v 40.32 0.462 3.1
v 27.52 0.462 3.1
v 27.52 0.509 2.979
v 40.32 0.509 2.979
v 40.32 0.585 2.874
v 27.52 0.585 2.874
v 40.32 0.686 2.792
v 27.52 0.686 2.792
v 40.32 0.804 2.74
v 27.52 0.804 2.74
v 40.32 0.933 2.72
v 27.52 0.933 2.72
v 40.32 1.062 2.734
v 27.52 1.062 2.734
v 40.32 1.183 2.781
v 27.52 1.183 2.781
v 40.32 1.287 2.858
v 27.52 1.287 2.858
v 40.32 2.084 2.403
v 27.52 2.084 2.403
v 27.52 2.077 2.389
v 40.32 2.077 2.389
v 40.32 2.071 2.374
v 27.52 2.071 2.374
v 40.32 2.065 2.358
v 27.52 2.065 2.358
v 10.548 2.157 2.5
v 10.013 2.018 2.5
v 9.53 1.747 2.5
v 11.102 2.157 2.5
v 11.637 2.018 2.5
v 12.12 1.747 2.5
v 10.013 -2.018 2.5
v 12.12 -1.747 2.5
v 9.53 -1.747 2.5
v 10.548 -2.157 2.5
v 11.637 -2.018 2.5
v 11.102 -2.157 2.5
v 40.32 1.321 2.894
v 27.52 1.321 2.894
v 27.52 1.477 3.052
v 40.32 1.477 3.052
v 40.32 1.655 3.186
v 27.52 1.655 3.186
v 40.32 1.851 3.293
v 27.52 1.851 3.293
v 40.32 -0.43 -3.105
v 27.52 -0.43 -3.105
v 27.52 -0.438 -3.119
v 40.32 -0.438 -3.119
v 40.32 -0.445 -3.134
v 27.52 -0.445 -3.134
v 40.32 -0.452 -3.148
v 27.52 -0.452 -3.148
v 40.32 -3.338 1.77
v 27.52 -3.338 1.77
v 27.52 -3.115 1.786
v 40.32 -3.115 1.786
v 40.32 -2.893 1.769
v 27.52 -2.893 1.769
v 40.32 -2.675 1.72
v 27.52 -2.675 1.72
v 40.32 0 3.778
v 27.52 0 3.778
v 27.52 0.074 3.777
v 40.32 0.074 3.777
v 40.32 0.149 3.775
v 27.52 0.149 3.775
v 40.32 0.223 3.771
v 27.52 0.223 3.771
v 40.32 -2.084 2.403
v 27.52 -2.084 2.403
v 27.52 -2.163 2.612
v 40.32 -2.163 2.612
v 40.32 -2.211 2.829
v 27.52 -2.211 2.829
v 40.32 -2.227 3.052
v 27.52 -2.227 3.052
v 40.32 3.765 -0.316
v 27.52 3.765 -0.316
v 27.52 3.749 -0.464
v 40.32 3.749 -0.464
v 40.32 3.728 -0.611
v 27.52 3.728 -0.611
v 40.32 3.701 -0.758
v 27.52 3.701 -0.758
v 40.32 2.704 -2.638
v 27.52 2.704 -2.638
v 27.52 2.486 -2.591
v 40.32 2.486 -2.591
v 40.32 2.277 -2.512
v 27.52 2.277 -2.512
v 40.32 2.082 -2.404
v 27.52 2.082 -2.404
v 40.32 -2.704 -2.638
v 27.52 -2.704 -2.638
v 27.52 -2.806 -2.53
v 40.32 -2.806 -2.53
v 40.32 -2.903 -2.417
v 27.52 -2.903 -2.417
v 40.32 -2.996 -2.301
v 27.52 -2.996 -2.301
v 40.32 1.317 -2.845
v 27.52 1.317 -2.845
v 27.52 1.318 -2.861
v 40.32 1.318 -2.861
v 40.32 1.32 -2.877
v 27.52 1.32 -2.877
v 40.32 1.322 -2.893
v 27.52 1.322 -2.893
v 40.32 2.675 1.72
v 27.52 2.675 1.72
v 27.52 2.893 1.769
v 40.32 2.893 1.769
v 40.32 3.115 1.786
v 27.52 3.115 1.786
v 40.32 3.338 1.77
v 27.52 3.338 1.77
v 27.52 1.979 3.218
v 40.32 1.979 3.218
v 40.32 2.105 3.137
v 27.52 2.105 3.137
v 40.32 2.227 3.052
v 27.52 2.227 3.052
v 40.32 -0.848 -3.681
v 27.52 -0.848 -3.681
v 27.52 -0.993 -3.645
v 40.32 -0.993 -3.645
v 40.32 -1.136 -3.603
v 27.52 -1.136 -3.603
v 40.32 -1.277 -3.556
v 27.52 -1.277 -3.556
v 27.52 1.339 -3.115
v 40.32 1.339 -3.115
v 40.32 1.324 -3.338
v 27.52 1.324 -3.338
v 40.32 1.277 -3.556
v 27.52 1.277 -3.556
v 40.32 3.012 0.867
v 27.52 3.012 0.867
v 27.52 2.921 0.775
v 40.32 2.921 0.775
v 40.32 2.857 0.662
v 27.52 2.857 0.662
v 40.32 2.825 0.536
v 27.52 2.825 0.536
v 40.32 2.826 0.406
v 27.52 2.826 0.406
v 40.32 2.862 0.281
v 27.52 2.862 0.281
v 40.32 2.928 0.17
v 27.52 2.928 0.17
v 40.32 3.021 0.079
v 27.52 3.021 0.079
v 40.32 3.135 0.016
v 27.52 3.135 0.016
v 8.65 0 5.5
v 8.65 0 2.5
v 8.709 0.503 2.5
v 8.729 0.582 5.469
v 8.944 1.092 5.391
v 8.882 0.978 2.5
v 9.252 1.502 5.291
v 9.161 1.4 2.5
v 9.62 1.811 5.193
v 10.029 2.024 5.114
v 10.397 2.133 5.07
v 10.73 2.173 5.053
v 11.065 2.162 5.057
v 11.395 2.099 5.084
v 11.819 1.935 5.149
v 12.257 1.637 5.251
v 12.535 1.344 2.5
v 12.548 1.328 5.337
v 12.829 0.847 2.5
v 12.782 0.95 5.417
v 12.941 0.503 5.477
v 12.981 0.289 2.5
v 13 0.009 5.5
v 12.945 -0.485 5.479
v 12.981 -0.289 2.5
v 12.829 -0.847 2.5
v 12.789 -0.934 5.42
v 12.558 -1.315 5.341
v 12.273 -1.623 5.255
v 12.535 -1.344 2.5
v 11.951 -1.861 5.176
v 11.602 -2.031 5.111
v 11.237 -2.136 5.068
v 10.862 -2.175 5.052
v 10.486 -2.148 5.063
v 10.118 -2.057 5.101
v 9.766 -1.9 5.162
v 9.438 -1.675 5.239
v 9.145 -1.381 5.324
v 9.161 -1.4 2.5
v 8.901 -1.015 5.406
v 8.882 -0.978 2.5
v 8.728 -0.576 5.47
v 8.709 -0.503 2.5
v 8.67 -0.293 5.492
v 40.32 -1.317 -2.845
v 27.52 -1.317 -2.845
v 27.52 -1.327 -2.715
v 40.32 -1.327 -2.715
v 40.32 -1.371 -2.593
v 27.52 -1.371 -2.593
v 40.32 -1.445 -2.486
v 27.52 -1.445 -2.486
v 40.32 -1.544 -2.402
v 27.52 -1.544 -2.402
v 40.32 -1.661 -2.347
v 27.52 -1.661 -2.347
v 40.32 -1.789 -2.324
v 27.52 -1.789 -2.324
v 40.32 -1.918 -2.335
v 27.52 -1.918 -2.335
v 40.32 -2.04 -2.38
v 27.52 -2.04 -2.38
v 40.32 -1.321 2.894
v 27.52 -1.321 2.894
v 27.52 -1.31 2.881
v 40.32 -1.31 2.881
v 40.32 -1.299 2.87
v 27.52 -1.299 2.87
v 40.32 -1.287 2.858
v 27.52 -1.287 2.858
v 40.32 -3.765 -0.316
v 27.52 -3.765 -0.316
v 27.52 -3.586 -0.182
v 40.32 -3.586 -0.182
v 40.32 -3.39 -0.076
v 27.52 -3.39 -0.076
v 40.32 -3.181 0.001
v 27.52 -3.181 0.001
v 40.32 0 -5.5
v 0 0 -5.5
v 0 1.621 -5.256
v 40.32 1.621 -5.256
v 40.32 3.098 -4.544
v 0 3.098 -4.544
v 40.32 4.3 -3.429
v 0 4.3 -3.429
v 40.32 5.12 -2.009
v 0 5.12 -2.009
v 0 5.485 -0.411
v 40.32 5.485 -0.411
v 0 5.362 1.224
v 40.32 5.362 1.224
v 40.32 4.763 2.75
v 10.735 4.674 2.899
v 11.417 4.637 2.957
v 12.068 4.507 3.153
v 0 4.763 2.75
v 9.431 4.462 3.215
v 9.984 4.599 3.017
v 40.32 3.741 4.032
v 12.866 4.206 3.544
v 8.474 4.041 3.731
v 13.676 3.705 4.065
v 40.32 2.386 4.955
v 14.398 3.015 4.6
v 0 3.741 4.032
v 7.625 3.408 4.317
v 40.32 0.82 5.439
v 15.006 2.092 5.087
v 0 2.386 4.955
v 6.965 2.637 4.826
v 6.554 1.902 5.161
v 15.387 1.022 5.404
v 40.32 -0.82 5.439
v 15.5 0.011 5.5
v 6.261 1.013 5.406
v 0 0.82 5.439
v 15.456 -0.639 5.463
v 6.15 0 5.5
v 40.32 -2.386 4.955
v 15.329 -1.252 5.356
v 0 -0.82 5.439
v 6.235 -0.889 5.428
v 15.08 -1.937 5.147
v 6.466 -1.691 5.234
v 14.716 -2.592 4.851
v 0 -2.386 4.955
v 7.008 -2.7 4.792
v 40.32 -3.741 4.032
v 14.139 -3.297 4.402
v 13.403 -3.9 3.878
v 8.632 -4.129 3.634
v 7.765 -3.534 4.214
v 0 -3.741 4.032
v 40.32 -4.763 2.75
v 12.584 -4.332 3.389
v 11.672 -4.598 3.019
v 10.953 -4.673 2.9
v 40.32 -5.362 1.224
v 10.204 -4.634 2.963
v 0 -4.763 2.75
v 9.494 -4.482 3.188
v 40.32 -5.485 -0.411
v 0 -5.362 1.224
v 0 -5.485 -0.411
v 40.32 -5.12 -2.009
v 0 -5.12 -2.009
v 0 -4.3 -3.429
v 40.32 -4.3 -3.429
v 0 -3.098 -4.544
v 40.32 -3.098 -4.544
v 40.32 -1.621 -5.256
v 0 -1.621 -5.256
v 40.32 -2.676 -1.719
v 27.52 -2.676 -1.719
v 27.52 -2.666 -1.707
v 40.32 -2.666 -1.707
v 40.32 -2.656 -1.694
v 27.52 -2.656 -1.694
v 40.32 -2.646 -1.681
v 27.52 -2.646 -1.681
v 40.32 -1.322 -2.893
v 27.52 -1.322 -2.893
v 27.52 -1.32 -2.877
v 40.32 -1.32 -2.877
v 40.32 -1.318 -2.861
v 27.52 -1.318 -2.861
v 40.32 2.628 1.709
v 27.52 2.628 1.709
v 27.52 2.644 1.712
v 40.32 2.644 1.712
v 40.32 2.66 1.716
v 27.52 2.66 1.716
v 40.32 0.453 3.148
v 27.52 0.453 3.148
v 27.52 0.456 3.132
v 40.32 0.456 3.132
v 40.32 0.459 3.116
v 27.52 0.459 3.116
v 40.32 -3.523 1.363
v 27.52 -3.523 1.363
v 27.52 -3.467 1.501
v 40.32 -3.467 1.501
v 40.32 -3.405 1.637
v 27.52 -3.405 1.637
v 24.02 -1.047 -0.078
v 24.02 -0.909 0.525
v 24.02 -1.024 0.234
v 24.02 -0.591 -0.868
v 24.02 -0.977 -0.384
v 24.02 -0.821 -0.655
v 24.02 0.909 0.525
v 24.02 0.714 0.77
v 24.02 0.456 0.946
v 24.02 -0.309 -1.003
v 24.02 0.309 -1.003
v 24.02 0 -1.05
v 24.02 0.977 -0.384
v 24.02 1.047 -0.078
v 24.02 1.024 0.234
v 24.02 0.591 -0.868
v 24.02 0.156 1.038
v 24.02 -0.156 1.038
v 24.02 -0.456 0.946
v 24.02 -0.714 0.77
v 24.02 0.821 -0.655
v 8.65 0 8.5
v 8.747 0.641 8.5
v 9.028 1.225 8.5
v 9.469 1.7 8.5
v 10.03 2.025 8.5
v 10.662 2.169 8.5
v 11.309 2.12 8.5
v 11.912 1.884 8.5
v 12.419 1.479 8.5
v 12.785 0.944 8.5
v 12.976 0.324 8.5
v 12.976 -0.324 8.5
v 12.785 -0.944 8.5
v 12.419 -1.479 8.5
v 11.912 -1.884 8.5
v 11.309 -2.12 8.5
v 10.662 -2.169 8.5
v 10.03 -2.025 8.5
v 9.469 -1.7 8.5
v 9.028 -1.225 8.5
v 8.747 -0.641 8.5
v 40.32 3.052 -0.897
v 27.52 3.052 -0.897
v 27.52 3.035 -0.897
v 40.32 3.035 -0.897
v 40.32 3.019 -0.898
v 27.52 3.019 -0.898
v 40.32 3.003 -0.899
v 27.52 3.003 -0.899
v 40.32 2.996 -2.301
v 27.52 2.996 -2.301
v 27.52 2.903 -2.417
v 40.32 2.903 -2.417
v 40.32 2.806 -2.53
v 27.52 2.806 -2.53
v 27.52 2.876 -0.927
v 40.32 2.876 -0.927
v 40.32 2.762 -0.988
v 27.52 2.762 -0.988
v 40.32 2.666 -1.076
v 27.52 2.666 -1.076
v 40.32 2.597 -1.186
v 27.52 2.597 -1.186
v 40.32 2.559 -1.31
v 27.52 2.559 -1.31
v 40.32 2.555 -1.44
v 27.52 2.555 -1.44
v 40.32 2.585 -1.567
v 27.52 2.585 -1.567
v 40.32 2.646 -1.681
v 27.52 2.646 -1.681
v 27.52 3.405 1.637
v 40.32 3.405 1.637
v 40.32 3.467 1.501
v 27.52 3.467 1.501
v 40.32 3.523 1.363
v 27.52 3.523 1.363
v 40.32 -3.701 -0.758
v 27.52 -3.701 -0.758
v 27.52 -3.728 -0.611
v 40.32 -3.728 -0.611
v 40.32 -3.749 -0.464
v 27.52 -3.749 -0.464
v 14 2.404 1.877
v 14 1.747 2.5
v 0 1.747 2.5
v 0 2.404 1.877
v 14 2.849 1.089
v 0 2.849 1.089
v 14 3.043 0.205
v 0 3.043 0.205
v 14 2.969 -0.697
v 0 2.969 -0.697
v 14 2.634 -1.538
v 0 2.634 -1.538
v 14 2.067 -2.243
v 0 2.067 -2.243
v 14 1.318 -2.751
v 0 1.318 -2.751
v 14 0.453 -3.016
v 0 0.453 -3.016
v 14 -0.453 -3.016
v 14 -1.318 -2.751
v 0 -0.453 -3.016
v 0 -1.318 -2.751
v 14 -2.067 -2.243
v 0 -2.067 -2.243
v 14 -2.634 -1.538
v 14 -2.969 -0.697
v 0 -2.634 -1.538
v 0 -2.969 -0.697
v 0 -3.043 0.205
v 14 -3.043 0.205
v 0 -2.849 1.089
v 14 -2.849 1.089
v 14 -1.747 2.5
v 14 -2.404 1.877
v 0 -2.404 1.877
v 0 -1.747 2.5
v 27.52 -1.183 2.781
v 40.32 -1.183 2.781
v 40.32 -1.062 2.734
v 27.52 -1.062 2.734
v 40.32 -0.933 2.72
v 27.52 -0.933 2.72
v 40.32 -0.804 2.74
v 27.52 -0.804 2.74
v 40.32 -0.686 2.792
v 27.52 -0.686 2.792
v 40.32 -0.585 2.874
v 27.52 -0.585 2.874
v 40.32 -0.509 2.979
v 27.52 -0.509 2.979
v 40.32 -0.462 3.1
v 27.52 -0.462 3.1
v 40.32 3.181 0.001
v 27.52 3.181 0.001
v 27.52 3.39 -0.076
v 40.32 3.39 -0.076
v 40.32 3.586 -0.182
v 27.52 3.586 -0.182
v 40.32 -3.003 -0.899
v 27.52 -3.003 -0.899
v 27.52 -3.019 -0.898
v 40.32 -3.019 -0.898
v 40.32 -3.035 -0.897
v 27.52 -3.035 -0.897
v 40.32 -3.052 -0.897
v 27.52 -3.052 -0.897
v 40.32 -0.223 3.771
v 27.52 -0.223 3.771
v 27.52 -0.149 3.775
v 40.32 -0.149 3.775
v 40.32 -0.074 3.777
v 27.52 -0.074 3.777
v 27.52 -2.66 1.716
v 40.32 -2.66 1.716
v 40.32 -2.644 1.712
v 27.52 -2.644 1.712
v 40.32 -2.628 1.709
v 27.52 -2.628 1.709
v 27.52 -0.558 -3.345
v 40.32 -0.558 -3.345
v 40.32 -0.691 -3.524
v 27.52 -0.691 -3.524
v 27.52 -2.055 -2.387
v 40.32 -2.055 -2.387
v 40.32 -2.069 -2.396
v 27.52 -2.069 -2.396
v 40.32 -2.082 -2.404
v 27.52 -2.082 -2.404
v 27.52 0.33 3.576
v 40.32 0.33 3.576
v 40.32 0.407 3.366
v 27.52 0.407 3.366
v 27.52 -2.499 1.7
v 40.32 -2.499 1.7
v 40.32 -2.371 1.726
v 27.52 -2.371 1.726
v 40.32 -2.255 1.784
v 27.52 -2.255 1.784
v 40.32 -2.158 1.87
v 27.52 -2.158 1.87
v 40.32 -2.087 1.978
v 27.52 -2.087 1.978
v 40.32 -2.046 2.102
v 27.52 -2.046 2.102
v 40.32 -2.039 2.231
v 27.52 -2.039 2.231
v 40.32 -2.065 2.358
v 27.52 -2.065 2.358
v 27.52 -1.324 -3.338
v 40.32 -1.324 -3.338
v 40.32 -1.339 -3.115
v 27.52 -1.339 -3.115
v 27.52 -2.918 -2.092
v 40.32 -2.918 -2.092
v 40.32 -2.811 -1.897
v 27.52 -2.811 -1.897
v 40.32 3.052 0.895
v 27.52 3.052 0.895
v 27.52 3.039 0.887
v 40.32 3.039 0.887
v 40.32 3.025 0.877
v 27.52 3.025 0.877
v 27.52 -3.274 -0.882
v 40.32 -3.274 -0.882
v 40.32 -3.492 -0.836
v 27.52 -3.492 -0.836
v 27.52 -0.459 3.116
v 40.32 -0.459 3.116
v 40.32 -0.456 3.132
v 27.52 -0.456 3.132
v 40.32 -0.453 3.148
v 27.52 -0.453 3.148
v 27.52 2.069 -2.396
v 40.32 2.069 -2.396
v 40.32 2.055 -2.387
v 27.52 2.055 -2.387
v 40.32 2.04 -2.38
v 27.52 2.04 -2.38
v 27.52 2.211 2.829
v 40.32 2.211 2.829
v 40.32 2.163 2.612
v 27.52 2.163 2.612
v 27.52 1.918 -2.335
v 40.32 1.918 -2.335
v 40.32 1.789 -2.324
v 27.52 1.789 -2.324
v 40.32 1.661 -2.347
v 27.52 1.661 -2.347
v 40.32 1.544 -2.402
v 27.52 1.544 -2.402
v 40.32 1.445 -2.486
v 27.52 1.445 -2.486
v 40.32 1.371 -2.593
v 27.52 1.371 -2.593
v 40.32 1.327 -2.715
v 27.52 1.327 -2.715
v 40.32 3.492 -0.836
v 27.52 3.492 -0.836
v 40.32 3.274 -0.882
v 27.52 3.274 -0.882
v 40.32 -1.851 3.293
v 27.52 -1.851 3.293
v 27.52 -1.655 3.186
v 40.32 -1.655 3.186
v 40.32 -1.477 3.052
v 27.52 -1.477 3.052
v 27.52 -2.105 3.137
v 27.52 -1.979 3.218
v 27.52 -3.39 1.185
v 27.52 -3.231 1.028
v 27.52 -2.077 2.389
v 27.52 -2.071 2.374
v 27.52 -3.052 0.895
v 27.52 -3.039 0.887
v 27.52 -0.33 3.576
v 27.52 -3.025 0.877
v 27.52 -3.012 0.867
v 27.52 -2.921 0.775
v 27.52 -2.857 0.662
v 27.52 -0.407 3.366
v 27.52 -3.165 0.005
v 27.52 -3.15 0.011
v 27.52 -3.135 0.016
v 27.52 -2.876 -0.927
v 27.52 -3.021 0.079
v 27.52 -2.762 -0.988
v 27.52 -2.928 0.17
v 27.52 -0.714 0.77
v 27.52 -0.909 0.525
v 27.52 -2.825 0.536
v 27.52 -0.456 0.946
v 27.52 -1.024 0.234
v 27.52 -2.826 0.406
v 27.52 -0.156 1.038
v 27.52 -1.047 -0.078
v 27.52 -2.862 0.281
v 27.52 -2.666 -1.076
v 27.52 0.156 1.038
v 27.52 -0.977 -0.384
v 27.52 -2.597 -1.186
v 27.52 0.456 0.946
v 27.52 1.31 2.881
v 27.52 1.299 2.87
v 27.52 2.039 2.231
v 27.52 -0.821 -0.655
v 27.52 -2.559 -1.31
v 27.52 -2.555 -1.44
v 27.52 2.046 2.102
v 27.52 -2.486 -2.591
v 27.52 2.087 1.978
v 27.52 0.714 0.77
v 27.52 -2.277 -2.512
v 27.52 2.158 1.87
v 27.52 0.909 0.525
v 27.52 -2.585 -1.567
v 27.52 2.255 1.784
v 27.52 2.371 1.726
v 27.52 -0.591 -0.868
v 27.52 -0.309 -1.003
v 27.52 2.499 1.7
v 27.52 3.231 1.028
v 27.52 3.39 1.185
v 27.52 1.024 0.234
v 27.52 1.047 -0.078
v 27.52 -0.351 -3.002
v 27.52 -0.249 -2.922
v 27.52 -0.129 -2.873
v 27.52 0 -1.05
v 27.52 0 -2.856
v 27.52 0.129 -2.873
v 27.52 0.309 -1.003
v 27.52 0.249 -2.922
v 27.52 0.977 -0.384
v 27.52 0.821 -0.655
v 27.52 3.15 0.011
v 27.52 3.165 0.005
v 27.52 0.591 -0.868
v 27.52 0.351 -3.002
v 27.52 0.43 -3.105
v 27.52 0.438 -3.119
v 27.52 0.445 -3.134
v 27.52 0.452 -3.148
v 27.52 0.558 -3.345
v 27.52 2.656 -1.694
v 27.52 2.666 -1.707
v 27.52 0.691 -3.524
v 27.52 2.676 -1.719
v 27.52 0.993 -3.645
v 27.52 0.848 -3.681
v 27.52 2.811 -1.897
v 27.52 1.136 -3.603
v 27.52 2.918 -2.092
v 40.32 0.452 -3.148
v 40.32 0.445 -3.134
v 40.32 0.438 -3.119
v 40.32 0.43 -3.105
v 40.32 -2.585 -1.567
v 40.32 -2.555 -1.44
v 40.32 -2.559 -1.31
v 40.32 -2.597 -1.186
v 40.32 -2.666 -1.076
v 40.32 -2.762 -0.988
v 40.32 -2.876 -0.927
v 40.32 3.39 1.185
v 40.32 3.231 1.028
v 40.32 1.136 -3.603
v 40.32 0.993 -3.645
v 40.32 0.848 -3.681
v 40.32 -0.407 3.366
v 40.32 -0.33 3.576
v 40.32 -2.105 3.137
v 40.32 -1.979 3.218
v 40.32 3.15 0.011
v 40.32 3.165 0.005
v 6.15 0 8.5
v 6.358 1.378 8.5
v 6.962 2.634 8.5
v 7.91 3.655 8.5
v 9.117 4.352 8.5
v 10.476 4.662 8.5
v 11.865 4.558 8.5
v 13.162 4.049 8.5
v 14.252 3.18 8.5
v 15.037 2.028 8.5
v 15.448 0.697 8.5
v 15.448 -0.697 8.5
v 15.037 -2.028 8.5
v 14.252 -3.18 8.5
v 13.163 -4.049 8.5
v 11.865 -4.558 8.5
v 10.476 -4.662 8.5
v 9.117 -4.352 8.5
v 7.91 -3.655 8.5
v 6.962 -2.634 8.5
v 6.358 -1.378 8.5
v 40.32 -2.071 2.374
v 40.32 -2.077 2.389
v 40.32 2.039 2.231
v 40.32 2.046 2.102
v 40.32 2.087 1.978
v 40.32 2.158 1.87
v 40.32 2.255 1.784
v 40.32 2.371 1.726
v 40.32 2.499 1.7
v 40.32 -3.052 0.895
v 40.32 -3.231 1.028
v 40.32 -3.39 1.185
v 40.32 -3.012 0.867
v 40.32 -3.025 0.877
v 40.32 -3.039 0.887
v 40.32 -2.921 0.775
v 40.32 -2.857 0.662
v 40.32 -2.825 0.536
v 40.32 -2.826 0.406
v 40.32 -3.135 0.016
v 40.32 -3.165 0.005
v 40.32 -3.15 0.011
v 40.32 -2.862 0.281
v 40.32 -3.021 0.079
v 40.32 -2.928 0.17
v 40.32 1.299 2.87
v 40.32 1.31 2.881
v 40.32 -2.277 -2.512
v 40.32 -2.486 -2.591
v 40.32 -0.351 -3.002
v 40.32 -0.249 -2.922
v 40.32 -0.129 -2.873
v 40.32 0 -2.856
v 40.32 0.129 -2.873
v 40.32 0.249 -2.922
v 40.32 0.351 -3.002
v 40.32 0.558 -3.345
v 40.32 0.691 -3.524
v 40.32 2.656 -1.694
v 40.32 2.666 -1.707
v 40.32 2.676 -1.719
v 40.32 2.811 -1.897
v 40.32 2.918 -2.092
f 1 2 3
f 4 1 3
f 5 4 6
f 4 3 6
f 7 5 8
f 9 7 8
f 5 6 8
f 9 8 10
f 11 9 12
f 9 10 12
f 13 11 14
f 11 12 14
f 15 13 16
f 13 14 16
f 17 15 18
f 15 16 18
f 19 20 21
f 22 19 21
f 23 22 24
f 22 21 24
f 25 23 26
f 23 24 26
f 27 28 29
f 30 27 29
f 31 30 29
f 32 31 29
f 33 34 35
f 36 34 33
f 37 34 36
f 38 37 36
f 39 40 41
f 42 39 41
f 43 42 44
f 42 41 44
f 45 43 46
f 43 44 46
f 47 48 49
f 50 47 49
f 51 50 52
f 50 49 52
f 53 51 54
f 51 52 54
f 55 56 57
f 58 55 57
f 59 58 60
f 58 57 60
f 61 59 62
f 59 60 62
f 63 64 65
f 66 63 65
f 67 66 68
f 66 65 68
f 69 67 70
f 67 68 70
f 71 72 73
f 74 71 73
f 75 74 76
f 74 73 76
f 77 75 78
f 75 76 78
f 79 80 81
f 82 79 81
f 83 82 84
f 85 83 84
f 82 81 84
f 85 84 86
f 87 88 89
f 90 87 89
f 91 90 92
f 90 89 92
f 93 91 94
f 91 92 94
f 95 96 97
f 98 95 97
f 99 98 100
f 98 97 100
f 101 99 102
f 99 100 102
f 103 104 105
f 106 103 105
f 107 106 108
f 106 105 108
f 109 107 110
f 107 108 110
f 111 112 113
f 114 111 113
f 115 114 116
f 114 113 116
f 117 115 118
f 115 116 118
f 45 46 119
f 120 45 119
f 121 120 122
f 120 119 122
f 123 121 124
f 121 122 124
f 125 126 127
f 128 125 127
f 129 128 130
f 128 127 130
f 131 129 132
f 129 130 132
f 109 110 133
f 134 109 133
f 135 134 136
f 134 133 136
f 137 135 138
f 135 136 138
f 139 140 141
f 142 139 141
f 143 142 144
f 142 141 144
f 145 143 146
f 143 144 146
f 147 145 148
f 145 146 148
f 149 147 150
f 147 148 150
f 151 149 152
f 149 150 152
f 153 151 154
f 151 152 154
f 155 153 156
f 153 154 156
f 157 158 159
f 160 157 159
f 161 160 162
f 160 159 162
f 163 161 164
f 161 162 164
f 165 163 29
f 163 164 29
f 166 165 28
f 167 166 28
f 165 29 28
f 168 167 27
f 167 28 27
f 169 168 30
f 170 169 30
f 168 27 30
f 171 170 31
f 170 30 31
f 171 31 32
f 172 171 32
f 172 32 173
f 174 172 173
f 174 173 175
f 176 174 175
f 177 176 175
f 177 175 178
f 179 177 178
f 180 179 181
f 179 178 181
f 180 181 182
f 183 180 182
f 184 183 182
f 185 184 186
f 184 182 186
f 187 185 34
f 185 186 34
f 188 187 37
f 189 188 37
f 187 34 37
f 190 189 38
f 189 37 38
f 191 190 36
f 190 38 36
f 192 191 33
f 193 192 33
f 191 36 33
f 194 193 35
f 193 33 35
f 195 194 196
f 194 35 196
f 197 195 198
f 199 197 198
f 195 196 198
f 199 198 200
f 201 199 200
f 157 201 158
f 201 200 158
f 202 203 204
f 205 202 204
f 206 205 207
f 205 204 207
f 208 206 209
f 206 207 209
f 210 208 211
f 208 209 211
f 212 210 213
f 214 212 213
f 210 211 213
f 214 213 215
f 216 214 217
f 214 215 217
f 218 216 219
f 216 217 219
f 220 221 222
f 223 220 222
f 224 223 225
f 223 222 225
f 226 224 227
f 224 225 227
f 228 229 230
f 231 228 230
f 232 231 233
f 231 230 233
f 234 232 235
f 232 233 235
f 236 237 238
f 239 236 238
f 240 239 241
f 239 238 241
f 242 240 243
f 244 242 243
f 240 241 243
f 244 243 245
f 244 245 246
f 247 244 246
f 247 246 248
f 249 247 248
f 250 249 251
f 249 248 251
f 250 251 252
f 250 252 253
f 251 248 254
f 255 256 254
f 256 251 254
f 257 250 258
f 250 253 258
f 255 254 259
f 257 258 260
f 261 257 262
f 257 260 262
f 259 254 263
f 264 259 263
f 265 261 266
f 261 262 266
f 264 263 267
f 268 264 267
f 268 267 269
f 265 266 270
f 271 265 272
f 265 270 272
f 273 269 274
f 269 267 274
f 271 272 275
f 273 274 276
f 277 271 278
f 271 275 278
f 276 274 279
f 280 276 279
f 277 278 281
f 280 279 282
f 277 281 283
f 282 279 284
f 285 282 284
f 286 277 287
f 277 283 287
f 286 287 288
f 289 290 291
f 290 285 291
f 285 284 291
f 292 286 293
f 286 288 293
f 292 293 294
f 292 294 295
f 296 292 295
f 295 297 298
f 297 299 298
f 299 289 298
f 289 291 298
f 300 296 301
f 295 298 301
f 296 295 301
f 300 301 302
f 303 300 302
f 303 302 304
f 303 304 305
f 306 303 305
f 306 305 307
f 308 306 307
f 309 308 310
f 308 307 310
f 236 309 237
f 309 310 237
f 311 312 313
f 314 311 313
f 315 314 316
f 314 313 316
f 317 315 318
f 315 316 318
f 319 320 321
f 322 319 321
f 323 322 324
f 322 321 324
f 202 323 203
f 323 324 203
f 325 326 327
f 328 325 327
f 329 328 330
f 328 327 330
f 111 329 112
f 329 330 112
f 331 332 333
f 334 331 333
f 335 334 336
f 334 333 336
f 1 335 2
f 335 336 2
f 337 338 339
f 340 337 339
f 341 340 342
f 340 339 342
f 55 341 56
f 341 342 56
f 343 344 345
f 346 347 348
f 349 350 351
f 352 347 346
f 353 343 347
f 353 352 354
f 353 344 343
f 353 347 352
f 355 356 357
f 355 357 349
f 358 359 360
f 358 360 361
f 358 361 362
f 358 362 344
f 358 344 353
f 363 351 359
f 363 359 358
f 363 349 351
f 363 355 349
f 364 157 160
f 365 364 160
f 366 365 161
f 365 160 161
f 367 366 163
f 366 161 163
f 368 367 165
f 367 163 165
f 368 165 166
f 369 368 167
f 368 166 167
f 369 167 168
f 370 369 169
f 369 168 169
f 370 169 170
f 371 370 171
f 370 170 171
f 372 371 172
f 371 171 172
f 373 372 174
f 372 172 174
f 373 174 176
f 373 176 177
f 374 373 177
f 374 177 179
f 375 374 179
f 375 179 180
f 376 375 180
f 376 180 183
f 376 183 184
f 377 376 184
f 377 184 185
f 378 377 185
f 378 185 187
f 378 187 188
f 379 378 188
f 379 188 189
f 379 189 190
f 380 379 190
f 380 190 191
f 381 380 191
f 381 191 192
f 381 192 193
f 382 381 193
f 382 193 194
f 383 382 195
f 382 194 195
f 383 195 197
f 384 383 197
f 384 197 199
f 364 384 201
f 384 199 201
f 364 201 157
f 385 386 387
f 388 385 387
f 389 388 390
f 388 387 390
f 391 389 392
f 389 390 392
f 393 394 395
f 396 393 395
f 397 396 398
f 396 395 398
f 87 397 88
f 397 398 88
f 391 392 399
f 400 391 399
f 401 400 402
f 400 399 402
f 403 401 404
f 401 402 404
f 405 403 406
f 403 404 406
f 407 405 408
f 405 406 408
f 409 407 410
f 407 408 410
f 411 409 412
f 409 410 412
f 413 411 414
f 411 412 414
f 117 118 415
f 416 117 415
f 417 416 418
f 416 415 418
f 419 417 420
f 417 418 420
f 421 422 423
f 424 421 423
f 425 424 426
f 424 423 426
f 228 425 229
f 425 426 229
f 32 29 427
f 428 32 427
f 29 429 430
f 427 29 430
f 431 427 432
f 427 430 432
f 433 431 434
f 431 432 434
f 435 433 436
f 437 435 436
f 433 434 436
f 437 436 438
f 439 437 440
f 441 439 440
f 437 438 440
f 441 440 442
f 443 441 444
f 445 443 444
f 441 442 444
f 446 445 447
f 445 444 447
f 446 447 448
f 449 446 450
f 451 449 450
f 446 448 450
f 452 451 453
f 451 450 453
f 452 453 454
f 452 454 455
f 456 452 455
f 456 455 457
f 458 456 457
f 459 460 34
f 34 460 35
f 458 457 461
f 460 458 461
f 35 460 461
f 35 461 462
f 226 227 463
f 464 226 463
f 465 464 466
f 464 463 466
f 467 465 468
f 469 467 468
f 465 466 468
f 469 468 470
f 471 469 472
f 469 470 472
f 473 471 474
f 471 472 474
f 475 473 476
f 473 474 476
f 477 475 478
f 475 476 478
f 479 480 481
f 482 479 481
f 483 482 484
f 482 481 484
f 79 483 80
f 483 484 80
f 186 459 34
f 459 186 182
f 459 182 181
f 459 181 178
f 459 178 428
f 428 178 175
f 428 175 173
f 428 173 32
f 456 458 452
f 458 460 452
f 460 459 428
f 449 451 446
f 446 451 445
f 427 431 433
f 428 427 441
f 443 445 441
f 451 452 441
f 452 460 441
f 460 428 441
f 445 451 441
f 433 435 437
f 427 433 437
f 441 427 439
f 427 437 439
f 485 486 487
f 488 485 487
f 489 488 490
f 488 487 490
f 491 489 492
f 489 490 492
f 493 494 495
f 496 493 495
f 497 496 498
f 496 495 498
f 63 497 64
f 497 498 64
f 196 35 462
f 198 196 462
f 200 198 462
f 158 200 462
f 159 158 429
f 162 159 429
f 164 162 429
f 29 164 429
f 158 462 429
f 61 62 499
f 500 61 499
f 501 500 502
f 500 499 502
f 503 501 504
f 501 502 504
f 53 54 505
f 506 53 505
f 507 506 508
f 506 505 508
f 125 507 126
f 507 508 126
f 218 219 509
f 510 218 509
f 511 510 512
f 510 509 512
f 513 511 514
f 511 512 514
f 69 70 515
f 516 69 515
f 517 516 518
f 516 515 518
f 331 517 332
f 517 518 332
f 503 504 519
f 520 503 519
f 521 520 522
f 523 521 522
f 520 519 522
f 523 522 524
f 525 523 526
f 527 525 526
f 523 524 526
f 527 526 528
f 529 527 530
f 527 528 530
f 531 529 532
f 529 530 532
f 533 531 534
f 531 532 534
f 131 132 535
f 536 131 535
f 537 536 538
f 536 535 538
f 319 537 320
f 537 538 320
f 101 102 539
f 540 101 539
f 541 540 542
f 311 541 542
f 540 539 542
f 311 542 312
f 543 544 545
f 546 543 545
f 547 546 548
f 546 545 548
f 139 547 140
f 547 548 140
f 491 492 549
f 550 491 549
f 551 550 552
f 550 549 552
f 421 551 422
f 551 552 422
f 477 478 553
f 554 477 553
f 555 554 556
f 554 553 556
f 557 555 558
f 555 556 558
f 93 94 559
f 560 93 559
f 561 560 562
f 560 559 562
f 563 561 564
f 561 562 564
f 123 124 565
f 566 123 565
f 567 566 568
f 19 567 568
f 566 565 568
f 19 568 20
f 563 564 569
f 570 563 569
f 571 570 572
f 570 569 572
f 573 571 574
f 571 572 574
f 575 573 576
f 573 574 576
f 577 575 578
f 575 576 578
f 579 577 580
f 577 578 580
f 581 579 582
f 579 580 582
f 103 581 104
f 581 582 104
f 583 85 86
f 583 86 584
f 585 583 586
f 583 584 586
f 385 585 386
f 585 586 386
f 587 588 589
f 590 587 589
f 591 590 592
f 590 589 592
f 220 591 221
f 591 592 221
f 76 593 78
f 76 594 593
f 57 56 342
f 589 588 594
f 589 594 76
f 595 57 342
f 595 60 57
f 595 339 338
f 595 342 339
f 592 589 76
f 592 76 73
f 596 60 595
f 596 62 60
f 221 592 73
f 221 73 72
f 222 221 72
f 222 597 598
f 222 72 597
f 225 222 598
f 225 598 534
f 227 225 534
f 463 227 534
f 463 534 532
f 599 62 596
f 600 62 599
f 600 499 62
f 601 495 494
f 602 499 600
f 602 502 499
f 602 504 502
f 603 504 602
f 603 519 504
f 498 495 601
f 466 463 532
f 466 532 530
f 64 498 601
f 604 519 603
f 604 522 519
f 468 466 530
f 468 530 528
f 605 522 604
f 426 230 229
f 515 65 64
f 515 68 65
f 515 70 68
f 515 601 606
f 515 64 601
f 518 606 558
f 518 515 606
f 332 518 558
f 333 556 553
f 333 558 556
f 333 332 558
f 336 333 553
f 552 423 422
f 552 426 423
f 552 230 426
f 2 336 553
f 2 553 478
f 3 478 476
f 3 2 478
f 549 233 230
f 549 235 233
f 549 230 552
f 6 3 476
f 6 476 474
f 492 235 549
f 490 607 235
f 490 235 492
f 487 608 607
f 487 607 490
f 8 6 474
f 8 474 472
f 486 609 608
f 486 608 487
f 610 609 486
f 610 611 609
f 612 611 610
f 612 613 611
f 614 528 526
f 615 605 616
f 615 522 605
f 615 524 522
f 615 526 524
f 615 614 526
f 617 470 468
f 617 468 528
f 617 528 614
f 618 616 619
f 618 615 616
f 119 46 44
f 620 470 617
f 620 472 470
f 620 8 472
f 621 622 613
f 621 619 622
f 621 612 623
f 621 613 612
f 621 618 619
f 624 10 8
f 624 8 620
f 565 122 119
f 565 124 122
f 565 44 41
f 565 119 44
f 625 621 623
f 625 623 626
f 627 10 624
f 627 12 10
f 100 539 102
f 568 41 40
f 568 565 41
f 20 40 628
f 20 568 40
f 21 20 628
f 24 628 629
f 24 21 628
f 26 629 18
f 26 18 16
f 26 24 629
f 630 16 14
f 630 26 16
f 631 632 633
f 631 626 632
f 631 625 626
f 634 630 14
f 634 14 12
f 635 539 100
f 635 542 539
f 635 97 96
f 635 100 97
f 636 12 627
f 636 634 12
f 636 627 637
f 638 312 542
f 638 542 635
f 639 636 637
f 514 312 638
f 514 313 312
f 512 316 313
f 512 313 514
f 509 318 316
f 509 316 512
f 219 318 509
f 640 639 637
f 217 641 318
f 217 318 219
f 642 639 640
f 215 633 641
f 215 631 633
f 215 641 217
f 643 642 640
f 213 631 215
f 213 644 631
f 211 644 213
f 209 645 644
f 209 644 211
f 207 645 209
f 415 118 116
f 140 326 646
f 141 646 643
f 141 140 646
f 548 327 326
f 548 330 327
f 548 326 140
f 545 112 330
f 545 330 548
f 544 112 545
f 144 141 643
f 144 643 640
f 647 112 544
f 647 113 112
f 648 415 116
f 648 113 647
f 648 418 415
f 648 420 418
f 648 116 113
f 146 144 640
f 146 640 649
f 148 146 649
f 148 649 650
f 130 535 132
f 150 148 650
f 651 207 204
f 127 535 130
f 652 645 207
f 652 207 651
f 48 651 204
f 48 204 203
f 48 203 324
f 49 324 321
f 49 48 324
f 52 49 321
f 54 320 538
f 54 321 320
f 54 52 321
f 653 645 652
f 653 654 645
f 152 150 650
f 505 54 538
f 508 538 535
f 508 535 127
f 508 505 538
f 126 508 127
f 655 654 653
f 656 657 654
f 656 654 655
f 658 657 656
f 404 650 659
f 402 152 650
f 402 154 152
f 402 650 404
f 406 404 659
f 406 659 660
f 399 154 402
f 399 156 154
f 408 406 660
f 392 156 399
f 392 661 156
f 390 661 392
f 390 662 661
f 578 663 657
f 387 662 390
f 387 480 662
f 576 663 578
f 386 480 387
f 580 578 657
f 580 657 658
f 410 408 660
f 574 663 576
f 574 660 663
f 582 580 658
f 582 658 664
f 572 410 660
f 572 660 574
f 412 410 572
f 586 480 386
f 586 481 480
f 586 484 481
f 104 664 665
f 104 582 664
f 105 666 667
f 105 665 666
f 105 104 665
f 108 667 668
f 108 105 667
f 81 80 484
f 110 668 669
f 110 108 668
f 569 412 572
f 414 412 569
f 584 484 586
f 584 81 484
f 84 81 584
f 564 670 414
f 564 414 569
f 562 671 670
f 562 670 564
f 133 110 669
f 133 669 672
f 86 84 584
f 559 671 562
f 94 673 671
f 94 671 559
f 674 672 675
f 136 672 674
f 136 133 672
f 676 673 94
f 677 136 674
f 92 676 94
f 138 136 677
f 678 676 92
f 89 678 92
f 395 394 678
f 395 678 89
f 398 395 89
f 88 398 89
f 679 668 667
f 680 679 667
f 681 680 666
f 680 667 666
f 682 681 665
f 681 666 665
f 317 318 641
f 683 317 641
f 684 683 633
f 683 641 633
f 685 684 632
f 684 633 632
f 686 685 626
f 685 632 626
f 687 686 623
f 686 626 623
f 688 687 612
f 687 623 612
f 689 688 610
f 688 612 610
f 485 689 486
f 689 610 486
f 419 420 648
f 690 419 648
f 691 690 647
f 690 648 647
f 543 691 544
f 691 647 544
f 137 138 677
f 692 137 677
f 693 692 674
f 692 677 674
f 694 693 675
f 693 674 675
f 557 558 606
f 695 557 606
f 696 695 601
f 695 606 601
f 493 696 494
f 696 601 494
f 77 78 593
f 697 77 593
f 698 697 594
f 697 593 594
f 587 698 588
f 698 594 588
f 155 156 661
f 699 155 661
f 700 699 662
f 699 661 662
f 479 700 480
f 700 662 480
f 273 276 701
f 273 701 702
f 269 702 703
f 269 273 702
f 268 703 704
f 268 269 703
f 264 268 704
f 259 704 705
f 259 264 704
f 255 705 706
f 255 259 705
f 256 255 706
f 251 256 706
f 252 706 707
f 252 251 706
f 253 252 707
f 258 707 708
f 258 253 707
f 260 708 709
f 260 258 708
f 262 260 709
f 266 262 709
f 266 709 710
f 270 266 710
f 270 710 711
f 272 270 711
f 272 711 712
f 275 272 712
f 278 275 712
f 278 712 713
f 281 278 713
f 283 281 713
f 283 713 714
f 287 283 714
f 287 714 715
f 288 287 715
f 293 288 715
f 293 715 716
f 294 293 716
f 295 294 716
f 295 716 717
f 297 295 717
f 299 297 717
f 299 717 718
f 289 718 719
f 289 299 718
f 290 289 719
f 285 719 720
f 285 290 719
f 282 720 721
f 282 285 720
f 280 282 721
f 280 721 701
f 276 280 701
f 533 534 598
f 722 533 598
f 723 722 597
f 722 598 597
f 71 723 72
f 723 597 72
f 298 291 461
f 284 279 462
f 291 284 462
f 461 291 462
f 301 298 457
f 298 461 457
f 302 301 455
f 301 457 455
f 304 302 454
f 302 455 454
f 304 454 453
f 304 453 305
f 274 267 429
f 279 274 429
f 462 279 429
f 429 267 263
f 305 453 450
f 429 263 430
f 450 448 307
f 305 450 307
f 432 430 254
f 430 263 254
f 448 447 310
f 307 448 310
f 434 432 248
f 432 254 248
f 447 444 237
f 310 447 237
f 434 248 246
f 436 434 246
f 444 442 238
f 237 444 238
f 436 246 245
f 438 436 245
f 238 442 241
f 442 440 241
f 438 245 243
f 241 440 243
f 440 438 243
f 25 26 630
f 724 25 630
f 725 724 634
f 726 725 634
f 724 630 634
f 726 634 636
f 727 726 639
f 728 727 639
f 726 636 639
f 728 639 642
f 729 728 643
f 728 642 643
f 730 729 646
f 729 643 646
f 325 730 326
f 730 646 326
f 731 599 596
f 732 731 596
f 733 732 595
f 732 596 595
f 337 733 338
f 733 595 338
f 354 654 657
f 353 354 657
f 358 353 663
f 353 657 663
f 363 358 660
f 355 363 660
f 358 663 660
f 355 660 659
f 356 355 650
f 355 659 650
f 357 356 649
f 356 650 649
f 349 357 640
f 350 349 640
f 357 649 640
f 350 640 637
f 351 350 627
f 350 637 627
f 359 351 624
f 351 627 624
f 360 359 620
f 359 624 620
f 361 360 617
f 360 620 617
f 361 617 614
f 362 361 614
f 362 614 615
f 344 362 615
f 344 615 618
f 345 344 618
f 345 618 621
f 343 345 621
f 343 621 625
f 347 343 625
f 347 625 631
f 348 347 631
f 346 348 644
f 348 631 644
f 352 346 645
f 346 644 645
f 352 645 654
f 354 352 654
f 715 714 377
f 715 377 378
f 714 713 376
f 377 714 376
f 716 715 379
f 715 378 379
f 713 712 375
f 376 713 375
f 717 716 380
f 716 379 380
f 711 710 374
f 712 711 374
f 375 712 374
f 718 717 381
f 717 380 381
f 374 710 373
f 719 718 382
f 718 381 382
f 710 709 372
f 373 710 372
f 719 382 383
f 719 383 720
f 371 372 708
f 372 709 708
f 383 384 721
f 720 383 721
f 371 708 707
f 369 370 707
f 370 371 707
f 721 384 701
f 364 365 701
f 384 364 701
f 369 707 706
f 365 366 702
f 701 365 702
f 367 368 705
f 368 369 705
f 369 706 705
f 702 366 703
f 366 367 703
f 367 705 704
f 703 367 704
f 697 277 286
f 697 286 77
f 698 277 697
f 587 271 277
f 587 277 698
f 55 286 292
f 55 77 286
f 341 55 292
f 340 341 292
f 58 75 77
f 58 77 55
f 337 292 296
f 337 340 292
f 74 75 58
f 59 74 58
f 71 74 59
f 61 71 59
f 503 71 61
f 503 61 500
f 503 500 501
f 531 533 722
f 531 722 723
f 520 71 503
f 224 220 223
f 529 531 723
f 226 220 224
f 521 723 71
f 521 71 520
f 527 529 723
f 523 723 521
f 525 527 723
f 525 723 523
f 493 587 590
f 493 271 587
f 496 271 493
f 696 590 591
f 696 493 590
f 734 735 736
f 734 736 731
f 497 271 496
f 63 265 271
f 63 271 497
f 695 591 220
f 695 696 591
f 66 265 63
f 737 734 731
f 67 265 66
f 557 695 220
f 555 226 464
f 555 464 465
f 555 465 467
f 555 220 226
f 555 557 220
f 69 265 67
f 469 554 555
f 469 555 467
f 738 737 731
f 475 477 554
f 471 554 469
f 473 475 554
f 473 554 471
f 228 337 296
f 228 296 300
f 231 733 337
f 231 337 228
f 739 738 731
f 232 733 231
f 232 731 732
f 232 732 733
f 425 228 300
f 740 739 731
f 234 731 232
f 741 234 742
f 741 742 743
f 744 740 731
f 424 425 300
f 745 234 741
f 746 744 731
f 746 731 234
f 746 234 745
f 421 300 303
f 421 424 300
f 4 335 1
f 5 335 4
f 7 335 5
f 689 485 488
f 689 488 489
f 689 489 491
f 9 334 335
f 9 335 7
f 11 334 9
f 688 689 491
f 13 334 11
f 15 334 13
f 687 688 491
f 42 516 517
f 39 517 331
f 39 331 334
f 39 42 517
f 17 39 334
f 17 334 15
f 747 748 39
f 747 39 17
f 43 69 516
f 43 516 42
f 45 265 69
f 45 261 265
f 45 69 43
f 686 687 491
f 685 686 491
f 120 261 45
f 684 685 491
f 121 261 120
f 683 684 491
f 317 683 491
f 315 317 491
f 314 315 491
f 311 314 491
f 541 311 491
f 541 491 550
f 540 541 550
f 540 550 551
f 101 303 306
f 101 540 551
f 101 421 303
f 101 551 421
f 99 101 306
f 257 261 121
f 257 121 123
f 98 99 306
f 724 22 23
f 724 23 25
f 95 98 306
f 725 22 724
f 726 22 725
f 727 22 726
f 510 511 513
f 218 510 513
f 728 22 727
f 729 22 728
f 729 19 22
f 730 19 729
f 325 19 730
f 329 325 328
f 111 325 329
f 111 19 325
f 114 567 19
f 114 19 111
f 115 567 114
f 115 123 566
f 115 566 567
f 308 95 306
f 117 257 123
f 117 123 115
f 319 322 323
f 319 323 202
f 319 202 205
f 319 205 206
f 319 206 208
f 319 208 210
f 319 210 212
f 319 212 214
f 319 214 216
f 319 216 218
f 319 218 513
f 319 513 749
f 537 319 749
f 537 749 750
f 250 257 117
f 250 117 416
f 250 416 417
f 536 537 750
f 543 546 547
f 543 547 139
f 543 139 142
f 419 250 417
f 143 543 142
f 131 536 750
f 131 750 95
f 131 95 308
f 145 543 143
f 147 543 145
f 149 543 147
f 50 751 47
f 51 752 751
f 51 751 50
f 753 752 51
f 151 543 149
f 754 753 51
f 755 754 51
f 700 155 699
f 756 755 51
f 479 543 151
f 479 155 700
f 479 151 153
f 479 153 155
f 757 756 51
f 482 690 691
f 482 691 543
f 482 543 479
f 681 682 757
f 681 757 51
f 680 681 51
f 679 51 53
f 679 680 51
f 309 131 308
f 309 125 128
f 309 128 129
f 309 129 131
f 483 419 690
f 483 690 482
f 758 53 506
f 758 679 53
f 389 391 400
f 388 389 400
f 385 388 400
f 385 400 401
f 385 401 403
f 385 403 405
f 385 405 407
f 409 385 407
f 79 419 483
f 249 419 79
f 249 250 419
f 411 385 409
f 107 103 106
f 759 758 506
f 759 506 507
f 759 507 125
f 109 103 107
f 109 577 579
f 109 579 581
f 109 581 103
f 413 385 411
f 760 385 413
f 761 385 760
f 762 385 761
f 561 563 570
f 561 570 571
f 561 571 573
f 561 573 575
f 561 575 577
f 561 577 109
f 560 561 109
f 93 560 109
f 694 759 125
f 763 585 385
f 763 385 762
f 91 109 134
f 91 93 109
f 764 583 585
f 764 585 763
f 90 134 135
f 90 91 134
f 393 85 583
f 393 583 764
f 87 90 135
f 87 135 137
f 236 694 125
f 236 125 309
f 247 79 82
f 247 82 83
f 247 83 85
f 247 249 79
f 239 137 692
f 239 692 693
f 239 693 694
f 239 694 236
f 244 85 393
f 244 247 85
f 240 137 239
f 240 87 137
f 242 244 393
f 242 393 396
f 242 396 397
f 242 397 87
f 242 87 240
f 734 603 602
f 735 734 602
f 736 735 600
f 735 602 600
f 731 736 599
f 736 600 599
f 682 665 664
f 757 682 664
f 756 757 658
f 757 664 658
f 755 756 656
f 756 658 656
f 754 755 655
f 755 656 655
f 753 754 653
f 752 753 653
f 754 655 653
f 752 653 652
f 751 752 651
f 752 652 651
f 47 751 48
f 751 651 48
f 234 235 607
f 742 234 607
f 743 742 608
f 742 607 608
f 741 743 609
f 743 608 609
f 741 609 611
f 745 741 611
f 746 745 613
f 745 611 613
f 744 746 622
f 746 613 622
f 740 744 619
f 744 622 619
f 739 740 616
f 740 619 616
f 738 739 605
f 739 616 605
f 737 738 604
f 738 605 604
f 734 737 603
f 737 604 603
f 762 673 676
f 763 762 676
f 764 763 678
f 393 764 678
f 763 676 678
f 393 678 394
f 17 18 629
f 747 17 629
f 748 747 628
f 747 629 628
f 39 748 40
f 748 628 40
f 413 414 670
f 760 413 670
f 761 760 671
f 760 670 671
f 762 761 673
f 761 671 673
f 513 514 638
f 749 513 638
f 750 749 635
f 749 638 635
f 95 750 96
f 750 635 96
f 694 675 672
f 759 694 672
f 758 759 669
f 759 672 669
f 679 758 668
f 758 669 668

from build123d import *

# Parameters (mm, degrees)
SKETCH1_R           = 5.5
BOSS_EXTRUDE1_DEPTH = 14
SKETCH2_R           = 5.5
BOSS_EXTRUDE2_DEPTH = 13.52
SKETCH3_R           = 5.5
BOSS_EXTRUDE3_DEPTH = 12.8
SKETCH4_R           = 1.05
CUT_EXTRUDE1_DEPTH  = 3.5
SKETCH5_R           = 4.675
SKETCH5_R_2         = 2.175
BOSS_EXTRUDE4_DEPTH = 6
SKETCH5_2_R         = 2.175
CUT_EXTRUDE2_DEPTH  = 42.472308963


with BuildPart() as part:
    # Sketch1 → Boss-Extrude1 (new body)
    with BuildSketch(Plane.YZ):
        Circle(SKETCH1_R)
        with BuildLine():
            Line((-1.747140521, 2.5), (1.747140521, 2.5))
            ThreePointArc((1.747140521, 2.5), (0, -3.05), (-1.747140521, 2.5))
        make_face(mode=Mode.SUBTRACT)
    extrude(amount=BOSS_EXTRUDE1_DEPTH)

    # Sketch2 → Boss-Extrude2 (add)
    with BuildSketch(Plane.YZ.offset(14)):
        Circle(SKETCH2_R)
    extrude(amount=BOSS_EXTRUDE2_DEPTH)

    # Sketch3 → Boss-Extrude3 (add)
    with BuildSketch(Plane.YZ.offset(27.52)):
        Circle(SKETCH3_R)
        with BuildLine():
            ThreePointArc((-1.322019746, -2.893008891), (-1.318956528, -2.868853063), (-1.317084788, -2.844575833))
            ThreePointArc((-1.317084788, -2.844575833), (-1.543809469, -2.402214423), (-2.040380396, -2.37974197))
            ThreePointArc((-2.040380396, -2.37974197), (-2.061686193, -2.391529691), (-2.0823866, -2.404350785))
            ThreePointArc((-2.0823866, -2.404350785), (-2.380259348, -2.555545236), (-2.703854763, -2.638454478))
            ThreePointArc((-2.703854763, -2.638454478), (-2.855120731, -2.473976197), (-2.996397469, -2.300842198))
            ThreePointArc((-2.996397469, -2.300842198), (-2.868279694, -1.992339732), (-2.676232473, -1.719016114))
            ThreePointArc((-2.676232473, -1.719016114), (-2.660595904, -1.700351039), (-2.645896034, -1.680939672))
            ThreePointArc((-2.645896034, -1.680939672), (-2.597470339, -1.186224957), (-3.003062861, -0.898853414))
            ThreePointArc((-3.003062861, -0.898853414), (-3.02735936, -0.897251093), (-3.051705258, -0.896845399))
            ThreePointArc((-3.051705258, -0.896845399), (-3.384033651, -0.862996099), (-3.701083558, -0.757794901))
            ThreePointArc((-3.701083558, -0.757794901), (-3.739412915, -0.537646409), (-3.764659163, -0.315616851))
            ThreePointArc((-3.764659163, -0.315616851), (-3.490090608, -0.12535376), (-3.1807603, 0.000752133))
            ThreePointArc((-3.1807603, 0.000752133), (-3.157514879, 0.008000426), (-3.134653985, 0.016382957))
            ThreePointArc((-3.134653985, 0.016382957), (-2.82645273, 0.406382552), (-3.012294086, 0.86741475))
            ThreePointArc((-3.012294086, 0.86741475), (-3.031867321, 0.881898388), (-3.052129059, 0.895402065))
            ThreePointArc((-3.052129059, 0.895402065), (-3.31340118, 1.103548202), (-3.523244473, 1.363459202))
            ThreePointArc((-3.523244473, 1.363459202), (-3.43646792, 1.569382314), (-3.337668173, 1.769814617))
            ThreePointArc((-3.337668173, 1.769814617), (-3.003822413, 1.781431146), (-2.675419206, 1.720281583))
            ThreePointArc((-2.675419206, 1.720281583), (-2.65194519, 1.713811812), (-2.628181444, 1.708504114))
            ThreePointArc((-2.628181444, 1.708504114), (-2.158056349, 1.869966471), (-2.065143222, 2.35828486))
            ThreePointArc((-2.065143222, 2.35828486), (-2.07377883, 2.381051361), (-2.083523449, 2.4033657))
            ThreePointArc((-2.083523449, 2.4033657), (-2.190787246, 2.719723746), (-2.226800162, 3.051824643))
            ThreePointArc((-2.226800162, 3.051824643), (-2.042468641, 3.178143241), (-1.850991121, 3.293342448))
            ThreePointArc((-1.850991121, 3.293342448), (-1.563861826, 3.12262425), (-1.320651417, 2.893633786))
            ThreePointArc((-1.320651417, 2.893633786), (-1.304401641, 2.875500057), (-1.287279864, 2.858187286))
            ThreePointArc((-1.287279864, 2.858187286), (-0.804492326, 2.739849249), (-0.462323977, 3.100416189))
            ThreePointArc((-0.462323977, 3.100416189), (-0.457280213, 3.124237351), (-0.453413865, 3.148277707))
            ThreePointArc((-0.453413865, 3.148277707), (-0.372613841, 3.472406218), (-0.223362534, 3.771257322))
            ThreePointArc((-0.223362534, 3.771257322), (-0.111730141, 3.776213578), (0, 3.777866145))
            ThreePointArc((0, 3.777866145), (0.111730141, 3.776213578), (0.223362534, 3.771257322))
            ThreePointArc((0.223362534, 3.771257322), (0.372613841, 3.472406218), (0.453413865, 3.148277707))
            ThreePointArc((0.453413865, 3.148277707), (0.457280213, 3.124237351), (0.462323977, 3.100416189))
            ThreePointArc((0.462323977, 3.100416189), (0.804492326, 2.739849249), (1.287279864, 2.858187286))
            ThreePointArc((1.287279864, 2.858187286), (1.304401641, 2.875500057), (1.320651417, 2.893633786))
            ThreePointArc((1.320651417, 2.893633786), (1.563861826, 3.12262425), (1.850991121, 3.293342448))
            ThreePointArc((1.850991121, 3.293342448), (2.042468641, 3.178143241), (2.226800162, 3.051824643))
            ThreePointArc((2.226800162, 3.051824643), (2.190787246, 2.719723746), (2.083523449, 2.4033657))
            ThreePointArc((2.083523449, 2.4033657), (2.07377883, 2.381051361), (2.065143222, 2.35828486))
            ThreePointArc((2.065143222, 2.35828486), (2.158056349, 1.869966471), (2.628181444, 1.708504114))
            ThreePointArc((2.628181444, 1.708504114), (2.65194519, 1.713811812), (2.675419206, 1.720281583))
            ThreePointArc((2.675419206, 1.720281583), (3.003822413, 1.781431146), (3.337668173, 1.769814617))
            ThreePointArc((3.337668173, 1.769814617), (3.43646792, 1.569382314), (3.523244473, 1.363459202))
            ThreePointArc((3.523244473, 1.363459202), (3.31340118, 1.103548202), (3.052129059, 0.895402065))
            ThreePointArc((3.052129059, 0.895402065), (3.031867321, 0.881898388), (3.012294086, 0.86741475))
            ThreePointArc((3.012294086, 0.86741475), (2.82645273, 0.406382552), (3.134653985, 0.016382957))
            ThreePointArc((3.134653985, 0.016382957), (3.157514879, 0.008000426), (3.1807603, 0.000752133))
            ThreePointArc((3.1807603, 0.000752133), (3.490090608, -0.12535376), (3.764659163, -0.315616851))
            ThreePointArc((3.764659163, -0.315616851), (3.739412915, -0.537646409), (3.701083558, -0.757794901))
            ThreePointArc((3.701083558, -0.757794901), (3.384033651, -0.862996099), (3.051705258, -0.896845399))
            ThreePointArc((3.051705258, -0.896845399), (3.02735936, -0.897251093), (3.003062861, -0.898853414))
            ThreePointArc((3.003062861, -0.898853414), (2.597470339, -1.186224957), (2.645896034, -1.680939672))
            ThreePointArc((2.645896034, -1.680939672), (2.660595904, -1.700351039), (2.676232473, -1.719016114))
            ThreePointArc((2.676232473, -1.719016114), (2.868279694, -1.992339732), (2.996397469, -2.300842198))
            ThreePointArc((2.996397469, -2.300842198), (2.855120731, -2.473976197), (2.703854763, -2.638454478))
            ThreePointArc((2.703854763, -2.638454478), (2.380259349, -2.555545235), (2.082386604, -2.404350784))
            ThreePointArc((2.082386604, -2.404350784), (2.061686196, -2.39152969), (2.0403804, -2.379741969))
            ThreePointArc((2.0403804, -2.379741969), (1.54380947, -2.402214422), (1.317084788, -2.844575834))
            ThreePointArc((1.317084788, -2.844575834), (1.318956528, -2.868853064), (1.322019746, -2.893008892))
            ThreePointArc((1.322019746, -2.893008892), (1.335810244, -3.226771918), (1.27680075, -3.555566405))
            ThreePointArc((1.27680075, -3.555566405), (1.064347889, -3.624836022), (0.848171186, -3.6814234))
            ThreePointArc((0.848171186, -3.6814234), (0.62076952, -3.436726817), (0.45192491, -3.148491786))
            ThreePointArc((0.45192491, -3.148491786), (0.441442226, -3.12651451), (0.429891573, -3.105079266))
            ThreePointArc((0.429891573, -3.105079266), (0, -2.855517783), (-0.429891573, -3.105079265))
            ThreePointArc((-0.429891573, -3.105079265), (-0.441442226, -3.12651451), (-0.45192491, -3.148491786))
            ThreePointArc((-0.45192491, -3.148491786), (-0.62076952, -3.436726817), (-0.848171186, -3.6814234))
            ThreePointArc((-0.848171186, -3.6814234), (-1.064347889, -3.624836022), (-1.27680075, -3.555566405))
            ThreePointArc((-1.27680075, -3.555566405), (-1.335810244, -3.226771917), (-1.322019746, -2.893008891))
        make_face(mode=Mode.SUBTRACT)
    extrude(amount=BOSS_EXTRUDE3_DEPTH)

    # Sketch4 → Cut-Extrude1 (cut)
    with BuildSketch(Plane.YZ.offset(27.52)):
        Circle(SKETCH4_R)
    extrude(amount=-CUT_EXTRUDE1_DEPTH, mode=Mode.SUBTRACT)

    # Sketch5 → Boss-Extrude4 (add)
    with BuildSketch(Plane(origin=(0, 0, 2.5), x_dir=(-1, 0, 0), z_dir=(0, 0, -1))):
        with Locations((-10.825, 0)):
            Circle(SKETCH5_R)
        with Locations((-10.825, 0)):
            Circle(SKETCH5_R_2, mode=Mode.SUBTRACT)
    extrude(amount=-BOSS_EXTRUDE4_DEPTH)

    # Sketch5<2> → Cut-Extrude2 (cut, through all)
    with BuildSketch(Plane(origin=(0, 0, 2.5), x_dir=(-1, 0, 0), z_dir=(0, 0, -1))):
        with Locations((-10.825, 0)):
            Circle(SKETCH5_2_R)
    extrude(amount=-CUT_EXTRUDE2_DEPTH, mode=Mode.SUBTRACT)


solid = part.part
